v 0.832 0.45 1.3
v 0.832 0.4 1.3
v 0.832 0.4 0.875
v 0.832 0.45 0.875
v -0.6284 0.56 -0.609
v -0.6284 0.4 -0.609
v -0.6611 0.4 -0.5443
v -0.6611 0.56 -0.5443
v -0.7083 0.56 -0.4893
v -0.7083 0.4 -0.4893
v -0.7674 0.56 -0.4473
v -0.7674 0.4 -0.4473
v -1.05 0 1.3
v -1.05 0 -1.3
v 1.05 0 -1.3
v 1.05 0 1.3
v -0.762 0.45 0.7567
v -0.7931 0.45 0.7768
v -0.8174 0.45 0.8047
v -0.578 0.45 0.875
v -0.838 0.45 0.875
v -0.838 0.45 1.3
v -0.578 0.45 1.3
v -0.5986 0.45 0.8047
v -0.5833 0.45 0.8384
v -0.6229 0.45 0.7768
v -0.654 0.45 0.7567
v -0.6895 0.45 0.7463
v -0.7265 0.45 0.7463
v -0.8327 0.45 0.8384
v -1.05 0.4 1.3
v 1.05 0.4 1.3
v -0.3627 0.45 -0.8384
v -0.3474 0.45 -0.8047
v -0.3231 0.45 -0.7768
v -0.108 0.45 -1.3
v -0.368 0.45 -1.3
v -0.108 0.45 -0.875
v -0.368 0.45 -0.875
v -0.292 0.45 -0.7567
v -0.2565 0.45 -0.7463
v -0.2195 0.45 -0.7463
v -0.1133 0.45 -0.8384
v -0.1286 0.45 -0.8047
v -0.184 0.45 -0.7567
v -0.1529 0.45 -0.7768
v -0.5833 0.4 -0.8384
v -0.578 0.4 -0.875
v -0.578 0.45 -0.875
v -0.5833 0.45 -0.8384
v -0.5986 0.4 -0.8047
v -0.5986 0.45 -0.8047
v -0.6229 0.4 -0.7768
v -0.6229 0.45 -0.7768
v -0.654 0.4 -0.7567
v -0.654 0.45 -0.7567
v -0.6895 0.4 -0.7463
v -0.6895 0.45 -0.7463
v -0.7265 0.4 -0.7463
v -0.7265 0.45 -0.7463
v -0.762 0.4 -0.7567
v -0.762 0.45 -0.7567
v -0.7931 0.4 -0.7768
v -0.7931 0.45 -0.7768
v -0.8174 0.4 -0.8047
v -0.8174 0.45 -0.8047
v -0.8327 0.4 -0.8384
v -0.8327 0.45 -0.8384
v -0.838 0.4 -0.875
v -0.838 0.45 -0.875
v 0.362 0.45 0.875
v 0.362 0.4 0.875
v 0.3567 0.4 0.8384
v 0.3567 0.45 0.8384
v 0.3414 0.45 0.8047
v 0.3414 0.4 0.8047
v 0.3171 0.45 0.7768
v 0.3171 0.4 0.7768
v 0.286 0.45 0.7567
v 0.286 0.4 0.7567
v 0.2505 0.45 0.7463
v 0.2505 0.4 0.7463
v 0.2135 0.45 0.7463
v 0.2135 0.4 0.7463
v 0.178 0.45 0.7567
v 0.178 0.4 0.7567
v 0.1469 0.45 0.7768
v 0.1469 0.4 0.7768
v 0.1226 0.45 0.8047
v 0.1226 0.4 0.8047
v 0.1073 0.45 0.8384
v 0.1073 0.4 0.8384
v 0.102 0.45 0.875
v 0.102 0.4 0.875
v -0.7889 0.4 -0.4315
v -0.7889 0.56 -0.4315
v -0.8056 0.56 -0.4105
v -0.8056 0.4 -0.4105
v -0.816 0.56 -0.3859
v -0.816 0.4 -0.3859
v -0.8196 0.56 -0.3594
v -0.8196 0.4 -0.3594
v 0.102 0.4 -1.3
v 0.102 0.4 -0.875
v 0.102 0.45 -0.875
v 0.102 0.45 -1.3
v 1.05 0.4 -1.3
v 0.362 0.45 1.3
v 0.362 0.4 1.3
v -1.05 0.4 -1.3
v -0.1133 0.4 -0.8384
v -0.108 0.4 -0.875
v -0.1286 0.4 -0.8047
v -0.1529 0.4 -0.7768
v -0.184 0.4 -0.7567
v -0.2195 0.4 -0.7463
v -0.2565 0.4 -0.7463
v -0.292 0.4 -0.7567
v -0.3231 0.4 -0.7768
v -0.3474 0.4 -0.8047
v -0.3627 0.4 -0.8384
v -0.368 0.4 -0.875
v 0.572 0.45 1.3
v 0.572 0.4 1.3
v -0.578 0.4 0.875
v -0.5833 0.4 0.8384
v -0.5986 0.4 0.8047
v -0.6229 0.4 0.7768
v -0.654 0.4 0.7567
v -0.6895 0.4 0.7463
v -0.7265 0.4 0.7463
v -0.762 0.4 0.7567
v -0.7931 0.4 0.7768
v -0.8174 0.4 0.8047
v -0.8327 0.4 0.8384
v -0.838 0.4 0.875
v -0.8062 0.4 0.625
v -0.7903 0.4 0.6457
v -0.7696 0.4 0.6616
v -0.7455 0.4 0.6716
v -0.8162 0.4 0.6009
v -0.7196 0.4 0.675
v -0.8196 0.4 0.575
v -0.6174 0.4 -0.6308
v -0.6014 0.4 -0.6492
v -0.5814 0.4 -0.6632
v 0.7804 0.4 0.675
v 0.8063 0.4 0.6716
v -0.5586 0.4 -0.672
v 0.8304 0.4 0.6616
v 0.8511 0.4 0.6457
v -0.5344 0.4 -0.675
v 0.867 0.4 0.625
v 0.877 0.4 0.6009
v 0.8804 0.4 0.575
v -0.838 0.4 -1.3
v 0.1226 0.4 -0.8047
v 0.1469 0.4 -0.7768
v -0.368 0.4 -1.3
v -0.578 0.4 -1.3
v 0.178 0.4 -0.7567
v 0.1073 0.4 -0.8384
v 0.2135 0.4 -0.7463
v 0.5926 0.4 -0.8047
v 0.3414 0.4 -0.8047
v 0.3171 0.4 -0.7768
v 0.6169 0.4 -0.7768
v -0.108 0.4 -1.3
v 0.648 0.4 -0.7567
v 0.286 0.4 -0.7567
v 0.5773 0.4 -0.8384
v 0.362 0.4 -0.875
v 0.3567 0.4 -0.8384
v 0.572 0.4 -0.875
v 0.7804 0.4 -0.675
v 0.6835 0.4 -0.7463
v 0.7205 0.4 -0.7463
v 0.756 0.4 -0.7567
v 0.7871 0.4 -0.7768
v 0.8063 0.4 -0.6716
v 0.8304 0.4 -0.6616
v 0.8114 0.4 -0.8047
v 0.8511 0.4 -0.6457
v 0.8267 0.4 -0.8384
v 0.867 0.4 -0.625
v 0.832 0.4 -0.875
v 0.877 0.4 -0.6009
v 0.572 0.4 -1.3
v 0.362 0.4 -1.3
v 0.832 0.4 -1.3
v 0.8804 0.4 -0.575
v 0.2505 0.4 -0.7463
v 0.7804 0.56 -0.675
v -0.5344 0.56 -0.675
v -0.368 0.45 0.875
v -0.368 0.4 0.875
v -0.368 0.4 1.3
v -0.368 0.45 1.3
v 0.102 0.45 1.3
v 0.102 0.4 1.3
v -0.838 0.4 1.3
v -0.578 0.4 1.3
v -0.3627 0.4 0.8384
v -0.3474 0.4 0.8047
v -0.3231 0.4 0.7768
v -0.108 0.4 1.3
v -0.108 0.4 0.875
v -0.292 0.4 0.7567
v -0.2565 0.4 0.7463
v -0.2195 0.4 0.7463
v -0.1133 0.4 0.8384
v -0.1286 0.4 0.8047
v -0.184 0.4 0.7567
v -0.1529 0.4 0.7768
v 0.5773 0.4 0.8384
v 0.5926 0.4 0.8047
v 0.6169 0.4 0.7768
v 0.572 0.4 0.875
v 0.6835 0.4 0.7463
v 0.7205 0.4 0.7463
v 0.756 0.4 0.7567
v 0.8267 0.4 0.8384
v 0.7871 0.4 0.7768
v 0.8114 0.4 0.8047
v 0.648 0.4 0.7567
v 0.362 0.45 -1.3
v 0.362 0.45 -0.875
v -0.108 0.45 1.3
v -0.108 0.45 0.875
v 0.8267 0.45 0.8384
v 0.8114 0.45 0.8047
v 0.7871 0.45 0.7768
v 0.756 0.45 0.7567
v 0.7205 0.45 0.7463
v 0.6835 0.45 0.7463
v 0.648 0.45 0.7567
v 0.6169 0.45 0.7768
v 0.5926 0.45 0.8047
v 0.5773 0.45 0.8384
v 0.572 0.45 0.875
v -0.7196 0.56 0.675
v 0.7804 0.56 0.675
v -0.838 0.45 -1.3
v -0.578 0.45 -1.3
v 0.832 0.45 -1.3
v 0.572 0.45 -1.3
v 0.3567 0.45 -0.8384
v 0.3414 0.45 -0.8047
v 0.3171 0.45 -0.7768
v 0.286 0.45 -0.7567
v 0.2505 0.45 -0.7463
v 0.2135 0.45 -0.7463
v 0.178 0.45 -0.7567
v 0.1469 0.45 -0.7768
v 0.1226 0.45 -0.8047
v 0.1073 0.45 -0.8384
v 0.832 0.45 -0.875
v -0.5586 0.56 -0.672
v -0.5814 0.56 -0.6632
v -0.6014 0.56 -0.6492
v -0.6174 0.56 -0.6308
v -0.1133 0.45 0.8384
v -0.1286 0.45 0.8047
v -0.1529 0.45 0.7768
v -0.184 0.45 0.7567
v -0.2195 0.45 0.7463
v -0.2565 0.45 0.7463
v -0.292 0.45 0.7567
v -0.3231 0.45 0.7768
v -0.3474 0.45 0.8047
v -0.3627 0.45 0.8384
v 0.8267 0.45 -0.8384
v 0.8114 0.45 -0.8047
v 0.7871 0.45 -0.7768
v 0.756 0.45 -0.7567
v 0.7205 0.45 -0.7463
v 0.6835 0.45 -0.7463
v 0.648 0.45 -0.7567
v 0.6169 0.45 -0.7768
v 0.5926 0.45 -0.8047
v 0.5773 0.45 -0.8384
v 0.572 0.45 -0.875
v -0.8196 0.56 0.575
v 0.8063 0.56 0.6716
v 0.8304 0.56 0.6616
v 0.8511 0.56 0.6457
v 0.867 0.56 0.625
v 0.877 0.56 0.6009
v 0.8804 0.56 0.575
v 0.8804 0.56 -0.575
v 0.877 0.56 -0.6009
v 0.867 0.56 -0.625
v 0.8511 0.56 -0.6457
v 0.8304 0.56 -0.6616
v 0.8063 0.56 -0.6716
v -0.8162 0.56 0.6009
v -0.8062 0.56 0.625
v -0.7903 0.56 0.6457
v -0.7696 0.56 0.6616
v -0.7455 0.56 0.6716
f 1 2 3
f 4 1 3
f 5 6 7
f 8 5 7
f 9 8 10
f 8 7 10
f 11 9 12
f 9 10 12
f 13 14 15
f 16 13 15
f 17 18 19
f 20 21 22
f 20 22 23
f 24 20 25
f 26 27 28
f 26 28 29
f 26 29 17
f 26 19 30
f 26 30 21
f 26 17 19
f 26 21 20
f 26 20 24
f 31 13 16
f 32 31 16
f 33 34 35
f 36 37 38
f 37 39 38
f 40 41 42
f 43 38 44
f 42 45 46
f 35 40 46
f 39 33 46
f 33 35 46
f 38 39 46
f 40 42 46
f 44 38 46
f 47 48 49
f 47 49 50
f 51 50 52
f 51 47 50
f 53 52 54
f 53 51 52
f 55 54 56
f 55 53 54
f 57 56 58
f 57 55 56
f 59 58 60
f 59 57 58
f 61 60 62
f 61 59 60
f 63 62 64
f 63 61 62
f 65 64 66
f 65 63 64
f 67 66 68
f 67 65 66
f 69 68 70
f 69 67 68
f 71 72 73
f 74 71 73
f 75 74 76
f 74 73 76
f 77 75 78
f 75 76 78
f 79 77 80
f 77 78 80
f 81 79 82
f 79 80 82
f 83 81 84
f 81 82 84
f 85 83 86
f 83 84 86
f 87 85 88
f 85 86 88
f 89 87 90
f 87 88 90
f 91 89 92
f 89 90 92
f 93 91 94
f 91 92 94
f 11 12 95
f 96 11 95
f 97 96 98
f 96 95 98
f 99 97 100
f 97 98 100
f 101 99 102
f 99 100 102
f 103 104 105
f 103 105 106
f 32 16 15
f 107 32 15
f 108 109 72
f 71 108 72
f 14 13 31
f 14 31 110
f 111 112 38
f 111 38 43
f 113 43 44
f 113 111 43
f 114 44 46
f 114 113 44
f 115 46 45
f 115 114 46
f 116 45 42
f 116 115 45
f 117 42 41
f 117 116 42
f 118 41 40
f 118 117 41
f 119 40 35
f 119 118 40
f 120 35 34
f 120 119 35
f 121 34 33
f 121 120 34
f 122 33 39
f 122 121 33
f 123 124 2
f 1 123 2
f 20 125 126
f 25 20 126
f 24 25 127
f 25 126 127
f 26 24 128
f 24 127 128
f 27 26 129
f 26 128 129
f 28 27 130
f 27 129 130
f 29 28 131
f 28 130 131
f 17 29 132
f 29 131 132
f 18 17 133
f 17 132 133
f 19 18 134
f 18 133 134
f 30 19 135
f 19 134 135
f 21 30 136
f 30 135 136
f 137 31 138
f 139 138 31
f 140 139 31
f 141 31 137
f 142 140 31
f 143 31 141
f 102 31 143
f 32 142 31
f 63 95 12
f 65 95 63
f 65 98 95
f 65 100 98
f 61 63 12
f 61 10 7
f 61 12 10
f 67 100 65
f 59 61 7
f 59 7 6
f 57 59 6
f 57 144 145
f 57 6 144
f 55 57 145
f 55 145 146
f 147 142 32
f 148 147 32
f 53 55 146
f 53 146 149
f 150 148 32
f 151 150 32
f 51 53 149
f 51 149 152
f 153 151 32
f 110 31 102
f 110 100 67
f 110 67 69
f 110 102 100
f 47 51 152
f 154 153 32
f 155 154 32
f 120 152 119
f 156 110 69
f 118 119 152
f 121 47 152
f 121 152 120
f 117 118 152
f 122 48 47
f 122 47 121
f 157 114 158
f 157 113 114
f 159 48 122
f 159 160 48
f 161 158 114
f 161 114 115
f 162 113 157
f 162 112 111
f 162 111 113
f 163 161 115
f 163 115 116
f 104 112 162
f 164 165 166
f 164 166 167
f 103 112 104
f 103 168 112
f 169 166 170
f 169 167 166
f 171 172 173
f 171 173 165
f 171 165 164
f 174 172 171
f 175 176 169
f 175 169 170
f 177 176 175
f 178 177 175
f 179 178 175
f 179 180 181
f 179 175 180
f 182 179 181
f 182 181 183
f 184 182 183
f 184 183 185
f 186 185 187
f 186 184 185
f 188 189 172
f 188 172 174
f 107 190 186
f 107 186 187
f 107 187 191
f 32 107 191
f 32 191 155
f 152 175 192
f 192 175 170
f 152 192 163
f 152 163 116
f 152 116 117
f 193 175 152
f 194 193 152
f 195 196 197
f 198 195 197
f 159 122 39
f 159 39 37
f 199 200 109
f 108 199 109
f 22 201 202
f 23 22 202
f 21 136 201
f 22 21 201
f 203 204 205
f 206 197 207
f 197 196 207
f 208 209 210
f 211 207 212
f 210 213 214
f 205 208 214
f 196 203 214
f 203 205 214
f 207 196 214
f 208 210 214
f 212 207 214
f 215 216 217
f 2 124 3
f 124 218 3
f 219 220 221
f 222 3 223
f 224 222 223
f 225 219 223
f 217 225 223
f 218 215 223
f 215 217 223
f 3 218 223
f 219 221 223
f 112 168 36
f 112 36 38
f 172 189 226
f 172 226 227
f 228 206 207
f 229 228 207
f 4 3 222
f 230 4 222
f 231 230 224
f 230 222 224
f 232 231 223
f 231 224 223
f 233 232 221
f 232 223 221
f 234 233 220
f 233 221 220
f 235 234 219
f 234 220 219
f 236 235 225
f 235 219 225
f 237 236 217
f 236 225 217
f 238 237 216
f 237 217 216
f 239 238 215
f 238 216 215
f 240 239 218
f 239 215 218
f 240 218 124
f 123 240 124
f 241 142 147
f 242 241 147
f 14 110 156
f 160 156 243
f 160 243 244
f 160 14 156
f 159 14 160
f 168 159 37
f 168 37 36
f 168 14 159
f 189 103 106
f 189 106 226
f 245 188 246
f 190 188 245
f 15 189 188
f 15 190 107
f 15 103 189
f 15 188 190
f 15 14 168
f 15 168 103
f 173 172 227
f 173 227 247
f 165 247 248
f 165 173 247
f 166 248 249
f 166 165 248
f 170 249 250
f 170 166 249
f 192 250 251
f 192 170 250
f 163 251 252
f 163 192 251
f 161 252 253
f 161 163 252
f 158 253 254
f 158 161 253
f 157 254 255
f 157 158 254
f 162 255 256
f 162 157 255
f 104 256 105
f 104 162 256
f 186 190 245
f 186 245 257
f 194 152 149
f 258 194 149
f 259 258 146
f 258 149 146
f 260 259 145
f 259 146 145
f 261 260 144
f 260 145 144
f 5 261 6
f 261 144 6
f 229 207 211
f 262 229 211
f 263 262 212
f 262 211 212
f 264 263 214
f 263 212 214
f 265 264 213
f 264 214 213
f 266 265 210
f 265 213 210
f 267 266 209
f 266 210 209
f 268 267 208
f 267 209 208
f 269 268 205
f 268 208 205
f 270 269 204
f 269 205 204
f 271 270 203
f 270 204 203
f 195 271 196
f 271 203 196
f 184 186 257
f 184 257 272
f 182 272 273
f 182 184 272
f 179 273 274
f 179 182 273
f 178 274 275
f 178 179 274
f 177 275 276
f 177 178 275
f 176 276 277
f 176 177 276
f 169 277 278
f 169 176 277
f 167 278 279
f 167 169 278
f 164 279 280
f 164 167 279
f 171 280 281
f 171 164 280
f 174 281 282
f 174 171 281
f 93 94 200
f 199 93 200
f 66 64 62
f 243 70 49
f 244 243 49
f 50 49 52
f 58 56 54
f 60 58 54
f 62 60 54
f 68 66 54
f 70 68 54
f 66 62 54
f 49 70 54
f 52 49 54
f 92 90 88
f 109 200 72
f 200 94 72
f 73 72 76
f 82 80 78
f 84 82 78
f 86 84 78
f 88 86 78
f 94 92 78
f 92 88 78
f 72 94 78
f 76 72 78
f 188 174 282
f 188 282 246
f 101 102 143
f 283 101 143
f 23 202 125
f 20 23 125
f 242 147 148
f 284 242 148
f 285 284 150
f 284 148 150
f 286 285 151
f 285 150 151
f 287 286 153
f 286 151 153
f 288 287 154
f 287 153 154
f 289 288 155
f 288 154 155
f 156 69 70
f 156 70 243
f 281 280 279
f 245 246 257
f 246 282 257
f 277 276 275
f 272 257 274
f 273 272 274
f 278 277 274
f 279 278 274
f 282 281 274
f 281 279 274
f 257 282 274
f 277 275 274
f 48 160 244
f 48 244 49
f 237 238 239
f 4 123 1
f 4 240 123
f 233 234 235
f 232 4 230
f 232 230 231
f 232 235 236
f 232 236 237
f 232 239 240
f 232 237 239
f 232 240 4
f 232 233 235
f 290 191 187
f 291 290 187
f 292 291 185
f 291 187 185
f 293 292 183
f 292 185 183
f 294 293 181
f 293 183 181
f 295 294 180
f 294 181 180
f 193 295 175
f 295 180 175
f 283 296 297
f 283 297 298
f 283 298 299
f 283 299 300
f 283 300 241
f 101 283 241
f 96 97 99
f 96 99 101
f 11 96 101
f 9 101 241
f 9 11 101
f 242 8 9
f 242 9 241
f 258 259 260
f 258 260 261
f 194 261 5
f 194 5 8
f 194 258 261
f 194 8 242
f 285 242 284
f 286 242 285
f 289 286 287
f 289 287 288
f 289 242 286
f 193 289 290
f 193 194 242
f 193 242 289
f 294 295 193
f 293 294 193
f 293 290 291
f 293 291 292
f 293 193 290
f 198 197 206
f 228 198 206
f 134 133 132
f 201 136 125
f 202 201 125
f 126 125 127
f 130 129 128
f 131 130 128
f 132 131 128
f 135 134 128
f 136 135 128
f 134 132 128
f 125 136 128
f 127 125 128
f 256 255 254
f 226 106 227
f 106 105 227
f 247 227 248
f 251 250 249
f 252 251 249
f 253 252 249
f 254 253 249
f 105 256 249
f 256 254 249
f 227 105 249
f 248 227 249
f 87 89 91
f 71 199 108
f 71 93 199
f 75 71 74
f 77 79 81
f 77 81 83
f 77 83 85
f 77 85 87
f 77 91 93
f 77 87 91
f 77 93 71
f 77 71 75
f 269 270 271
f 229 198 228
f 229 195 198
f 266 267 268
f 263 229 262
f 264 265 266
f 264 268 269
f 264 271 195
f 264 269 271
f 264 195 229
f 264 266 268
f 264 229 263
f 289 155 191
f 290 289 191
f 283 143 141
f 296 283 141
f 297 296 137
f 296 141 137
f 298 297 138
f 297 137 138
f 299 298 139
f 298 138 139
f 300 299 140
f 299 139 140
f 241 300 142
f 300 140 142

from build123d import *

# Parameters (mm, degrees)
SKETCH1_W           = 2.1
SKETCH1_H           = 2.6
BOSS_EXTRUDE1_DEPTH = 0.4
BOSS_EXTRUDE2_DEPTH = 0.16
BOSS_EXTRUDE3_DEPTH = 0.05


with BuildPart() as part:
    # Sketch1 → Boss-Extrude1 (new body)
    with BuildSketch(Plane(origin=(0, 0, 0), x_dir=(1, 0, 0), z_dir=(0, 1, 0))):
        Rectangle(SKETCH1_W, SKETCH1_H)
    extrude(amount=BOSS_EXTRUDE1_DEPTH)

    # Sketch2 → Boss-Extrude2 (add)
    with BuildSketch(Plane(origin=(0, 0.4, 0), x_dir=(1, 0, 0), z_dir=(0, 1, 0))):
        with BuildLine():
            Line((-0.819602151, 0.359414715), (-0.819602151, -0.575))
            ThreePointArc((-0.819602151, -0.575), (-0.79031283, -0.645710678), (-0.719602151, -0.675))
            Line((-0.719602151, -0.675), (0.780397849, -0.675))
            ThreePointArc((0.780397849, -0.675), (0.851108527, -0.645710678), (0.880397849, -0.575))
            Line((0.880397849, -0.575), (0.880397849, 0.575))
            ThreePointArc((0.880397849, 0.575), (0.851108527, 0.645710678), (0.780397849, 0.675))
            Line((0.780397849, 0.675), (-0.53439143, 0.675))
            ThreePointArc((-0.53439143, 0.675), (-0.591852021, 0.656843023), (-0.6284464, 0.608965609))
            ThreePointArc((-0.6284464, 0.608965609), (-0.683055267, 0.515367559), (-0.767354441, 0.447276646))
            ThreePointArc((-0.767354441, 0.447276646), (-0.805553385, 0.410526216), (-0.819602151, 0.359414715))
        make_face()
    extrude(amount=BOSS_EXTRUDE2_DEPTH)


with BuildPart() as body_2:
    # Sketch3 → Boss-Extrude3 (new body)
    with BuildSketch(Plane(origin=(0, 0.4, 0), x_dir=(1, 0, 0), z_dir=(0, 1, 0))):
        with BuildLine():
            Line((-0.368, -0.875), (-0.368, -1.3))
            Line((-0.368, -1.3), (-0.108, -1.3))
            Line((-0.108, -1.3), (-0.108, -0.875))
            ThreePointArc((-0.108, -0.875), (-0.238, -1.005), (-0.368, -0.875))
        make_face()
        with BuildLine():
            ThreePointArc((-0.108, -0.875), (-0.238, -0.745), (-0.368, -0.875))
            Line((-0.368, -0.875), (-0.108, -0.875))
        make_face()
        with BuildLine():
            Line((-0.108, -0.875), (-0.368, -0.875))
            ThreePointArc((-0.368, -0.875), (-0.238, -1.005), (-0.108, -0.875))
        make_face()
        with BuildLine():
            ThreePointArc((-0.578, -0.875), (-0.708, -0.745), (-0.838, -0.875))
            Line((-0.838, -0.875), (-0.578, -0.875))
        make_face()
        with BuildLine():
            Line((-0.578, -0.875), (-0.838, -0.875))
            ThreePointArc((-0.838, -0.875), (-0.708, -1.005), (-0.578, -0.875))
        make_face()
        with BuildLine():
            Line((-0.838, -0.875), (-0.838, -1.3))
            Line((-0.838, -1.3), (-0.578, -1.3))
            Line((-0.578, -1.3), (-0.578, -0.875))
            ThreePointArc((-0.578, -0.875), (-0.708, -1.005), (-0.838, -0.875))
        make_face()
        with BuildLine():
            Line((0.102, -0.875), (0.102, -1.3))
            Line((0.102, -1.3), (0.362, -1.3))
            Line((0.362, -1.3), (0.362, -0.875))
            ThreePointArc((0.362, -0.875), (0.232, -1.005), (0.102, -0.875))
        make_face()
        with BuildLine():
            ThreePointArc((0.362, -0.875), (0.232, -0.745), (0.102, -0.875))
            Line((0.102, -0.875), (0.362, -0.875))
        make_face()
        with BuildLine():
            Line((0.362, -0.875), (0.102, -0.875))
            ThreePointArc((0.102, -0.875), (0.232, -1.005), (0.362, -0.875))
        make_face()
        with BuildLine():
            Line((0.572, -0.875), (0.572, -1.3))
            Line((0.572, -1.3), (0.832, -1.3))
            Line((0.832, -1.3), (0.832, -0.875))
            ThreePointArc((0.832, -0.875), (0.702, -1.005), (0.572, -0.875))
        make_face()
        with BuildLine():
            ThreePointArc((0.832, -0.875), (0.702, -0.745), (0.572, -0.875))
            Line((0.572, -0.875), (0.832, -0.875))
        make_face()
        with BuildLine():
            Line((0.832, -0.875), (0.572, -0.875))
            ThreePointArc((0.572, -0.875), (0.702, -1.005), (0.832, -0.875))
        make_face()
    boss_extrude3 = extrude(amount=BOSS_EXTRUDE3_DEPTH)


with BuildPart() as part_1:
    add(part.part)

    # Mirror1: Boss-Extrude3 across plane
    add(boss_extrude3.mirror(Plane(origin=(0, 0, 0), x_dir=(1, 0, 0), z_dir=(0, 0, -1))))


solid = Compound([body_2.part, part_1.part])
